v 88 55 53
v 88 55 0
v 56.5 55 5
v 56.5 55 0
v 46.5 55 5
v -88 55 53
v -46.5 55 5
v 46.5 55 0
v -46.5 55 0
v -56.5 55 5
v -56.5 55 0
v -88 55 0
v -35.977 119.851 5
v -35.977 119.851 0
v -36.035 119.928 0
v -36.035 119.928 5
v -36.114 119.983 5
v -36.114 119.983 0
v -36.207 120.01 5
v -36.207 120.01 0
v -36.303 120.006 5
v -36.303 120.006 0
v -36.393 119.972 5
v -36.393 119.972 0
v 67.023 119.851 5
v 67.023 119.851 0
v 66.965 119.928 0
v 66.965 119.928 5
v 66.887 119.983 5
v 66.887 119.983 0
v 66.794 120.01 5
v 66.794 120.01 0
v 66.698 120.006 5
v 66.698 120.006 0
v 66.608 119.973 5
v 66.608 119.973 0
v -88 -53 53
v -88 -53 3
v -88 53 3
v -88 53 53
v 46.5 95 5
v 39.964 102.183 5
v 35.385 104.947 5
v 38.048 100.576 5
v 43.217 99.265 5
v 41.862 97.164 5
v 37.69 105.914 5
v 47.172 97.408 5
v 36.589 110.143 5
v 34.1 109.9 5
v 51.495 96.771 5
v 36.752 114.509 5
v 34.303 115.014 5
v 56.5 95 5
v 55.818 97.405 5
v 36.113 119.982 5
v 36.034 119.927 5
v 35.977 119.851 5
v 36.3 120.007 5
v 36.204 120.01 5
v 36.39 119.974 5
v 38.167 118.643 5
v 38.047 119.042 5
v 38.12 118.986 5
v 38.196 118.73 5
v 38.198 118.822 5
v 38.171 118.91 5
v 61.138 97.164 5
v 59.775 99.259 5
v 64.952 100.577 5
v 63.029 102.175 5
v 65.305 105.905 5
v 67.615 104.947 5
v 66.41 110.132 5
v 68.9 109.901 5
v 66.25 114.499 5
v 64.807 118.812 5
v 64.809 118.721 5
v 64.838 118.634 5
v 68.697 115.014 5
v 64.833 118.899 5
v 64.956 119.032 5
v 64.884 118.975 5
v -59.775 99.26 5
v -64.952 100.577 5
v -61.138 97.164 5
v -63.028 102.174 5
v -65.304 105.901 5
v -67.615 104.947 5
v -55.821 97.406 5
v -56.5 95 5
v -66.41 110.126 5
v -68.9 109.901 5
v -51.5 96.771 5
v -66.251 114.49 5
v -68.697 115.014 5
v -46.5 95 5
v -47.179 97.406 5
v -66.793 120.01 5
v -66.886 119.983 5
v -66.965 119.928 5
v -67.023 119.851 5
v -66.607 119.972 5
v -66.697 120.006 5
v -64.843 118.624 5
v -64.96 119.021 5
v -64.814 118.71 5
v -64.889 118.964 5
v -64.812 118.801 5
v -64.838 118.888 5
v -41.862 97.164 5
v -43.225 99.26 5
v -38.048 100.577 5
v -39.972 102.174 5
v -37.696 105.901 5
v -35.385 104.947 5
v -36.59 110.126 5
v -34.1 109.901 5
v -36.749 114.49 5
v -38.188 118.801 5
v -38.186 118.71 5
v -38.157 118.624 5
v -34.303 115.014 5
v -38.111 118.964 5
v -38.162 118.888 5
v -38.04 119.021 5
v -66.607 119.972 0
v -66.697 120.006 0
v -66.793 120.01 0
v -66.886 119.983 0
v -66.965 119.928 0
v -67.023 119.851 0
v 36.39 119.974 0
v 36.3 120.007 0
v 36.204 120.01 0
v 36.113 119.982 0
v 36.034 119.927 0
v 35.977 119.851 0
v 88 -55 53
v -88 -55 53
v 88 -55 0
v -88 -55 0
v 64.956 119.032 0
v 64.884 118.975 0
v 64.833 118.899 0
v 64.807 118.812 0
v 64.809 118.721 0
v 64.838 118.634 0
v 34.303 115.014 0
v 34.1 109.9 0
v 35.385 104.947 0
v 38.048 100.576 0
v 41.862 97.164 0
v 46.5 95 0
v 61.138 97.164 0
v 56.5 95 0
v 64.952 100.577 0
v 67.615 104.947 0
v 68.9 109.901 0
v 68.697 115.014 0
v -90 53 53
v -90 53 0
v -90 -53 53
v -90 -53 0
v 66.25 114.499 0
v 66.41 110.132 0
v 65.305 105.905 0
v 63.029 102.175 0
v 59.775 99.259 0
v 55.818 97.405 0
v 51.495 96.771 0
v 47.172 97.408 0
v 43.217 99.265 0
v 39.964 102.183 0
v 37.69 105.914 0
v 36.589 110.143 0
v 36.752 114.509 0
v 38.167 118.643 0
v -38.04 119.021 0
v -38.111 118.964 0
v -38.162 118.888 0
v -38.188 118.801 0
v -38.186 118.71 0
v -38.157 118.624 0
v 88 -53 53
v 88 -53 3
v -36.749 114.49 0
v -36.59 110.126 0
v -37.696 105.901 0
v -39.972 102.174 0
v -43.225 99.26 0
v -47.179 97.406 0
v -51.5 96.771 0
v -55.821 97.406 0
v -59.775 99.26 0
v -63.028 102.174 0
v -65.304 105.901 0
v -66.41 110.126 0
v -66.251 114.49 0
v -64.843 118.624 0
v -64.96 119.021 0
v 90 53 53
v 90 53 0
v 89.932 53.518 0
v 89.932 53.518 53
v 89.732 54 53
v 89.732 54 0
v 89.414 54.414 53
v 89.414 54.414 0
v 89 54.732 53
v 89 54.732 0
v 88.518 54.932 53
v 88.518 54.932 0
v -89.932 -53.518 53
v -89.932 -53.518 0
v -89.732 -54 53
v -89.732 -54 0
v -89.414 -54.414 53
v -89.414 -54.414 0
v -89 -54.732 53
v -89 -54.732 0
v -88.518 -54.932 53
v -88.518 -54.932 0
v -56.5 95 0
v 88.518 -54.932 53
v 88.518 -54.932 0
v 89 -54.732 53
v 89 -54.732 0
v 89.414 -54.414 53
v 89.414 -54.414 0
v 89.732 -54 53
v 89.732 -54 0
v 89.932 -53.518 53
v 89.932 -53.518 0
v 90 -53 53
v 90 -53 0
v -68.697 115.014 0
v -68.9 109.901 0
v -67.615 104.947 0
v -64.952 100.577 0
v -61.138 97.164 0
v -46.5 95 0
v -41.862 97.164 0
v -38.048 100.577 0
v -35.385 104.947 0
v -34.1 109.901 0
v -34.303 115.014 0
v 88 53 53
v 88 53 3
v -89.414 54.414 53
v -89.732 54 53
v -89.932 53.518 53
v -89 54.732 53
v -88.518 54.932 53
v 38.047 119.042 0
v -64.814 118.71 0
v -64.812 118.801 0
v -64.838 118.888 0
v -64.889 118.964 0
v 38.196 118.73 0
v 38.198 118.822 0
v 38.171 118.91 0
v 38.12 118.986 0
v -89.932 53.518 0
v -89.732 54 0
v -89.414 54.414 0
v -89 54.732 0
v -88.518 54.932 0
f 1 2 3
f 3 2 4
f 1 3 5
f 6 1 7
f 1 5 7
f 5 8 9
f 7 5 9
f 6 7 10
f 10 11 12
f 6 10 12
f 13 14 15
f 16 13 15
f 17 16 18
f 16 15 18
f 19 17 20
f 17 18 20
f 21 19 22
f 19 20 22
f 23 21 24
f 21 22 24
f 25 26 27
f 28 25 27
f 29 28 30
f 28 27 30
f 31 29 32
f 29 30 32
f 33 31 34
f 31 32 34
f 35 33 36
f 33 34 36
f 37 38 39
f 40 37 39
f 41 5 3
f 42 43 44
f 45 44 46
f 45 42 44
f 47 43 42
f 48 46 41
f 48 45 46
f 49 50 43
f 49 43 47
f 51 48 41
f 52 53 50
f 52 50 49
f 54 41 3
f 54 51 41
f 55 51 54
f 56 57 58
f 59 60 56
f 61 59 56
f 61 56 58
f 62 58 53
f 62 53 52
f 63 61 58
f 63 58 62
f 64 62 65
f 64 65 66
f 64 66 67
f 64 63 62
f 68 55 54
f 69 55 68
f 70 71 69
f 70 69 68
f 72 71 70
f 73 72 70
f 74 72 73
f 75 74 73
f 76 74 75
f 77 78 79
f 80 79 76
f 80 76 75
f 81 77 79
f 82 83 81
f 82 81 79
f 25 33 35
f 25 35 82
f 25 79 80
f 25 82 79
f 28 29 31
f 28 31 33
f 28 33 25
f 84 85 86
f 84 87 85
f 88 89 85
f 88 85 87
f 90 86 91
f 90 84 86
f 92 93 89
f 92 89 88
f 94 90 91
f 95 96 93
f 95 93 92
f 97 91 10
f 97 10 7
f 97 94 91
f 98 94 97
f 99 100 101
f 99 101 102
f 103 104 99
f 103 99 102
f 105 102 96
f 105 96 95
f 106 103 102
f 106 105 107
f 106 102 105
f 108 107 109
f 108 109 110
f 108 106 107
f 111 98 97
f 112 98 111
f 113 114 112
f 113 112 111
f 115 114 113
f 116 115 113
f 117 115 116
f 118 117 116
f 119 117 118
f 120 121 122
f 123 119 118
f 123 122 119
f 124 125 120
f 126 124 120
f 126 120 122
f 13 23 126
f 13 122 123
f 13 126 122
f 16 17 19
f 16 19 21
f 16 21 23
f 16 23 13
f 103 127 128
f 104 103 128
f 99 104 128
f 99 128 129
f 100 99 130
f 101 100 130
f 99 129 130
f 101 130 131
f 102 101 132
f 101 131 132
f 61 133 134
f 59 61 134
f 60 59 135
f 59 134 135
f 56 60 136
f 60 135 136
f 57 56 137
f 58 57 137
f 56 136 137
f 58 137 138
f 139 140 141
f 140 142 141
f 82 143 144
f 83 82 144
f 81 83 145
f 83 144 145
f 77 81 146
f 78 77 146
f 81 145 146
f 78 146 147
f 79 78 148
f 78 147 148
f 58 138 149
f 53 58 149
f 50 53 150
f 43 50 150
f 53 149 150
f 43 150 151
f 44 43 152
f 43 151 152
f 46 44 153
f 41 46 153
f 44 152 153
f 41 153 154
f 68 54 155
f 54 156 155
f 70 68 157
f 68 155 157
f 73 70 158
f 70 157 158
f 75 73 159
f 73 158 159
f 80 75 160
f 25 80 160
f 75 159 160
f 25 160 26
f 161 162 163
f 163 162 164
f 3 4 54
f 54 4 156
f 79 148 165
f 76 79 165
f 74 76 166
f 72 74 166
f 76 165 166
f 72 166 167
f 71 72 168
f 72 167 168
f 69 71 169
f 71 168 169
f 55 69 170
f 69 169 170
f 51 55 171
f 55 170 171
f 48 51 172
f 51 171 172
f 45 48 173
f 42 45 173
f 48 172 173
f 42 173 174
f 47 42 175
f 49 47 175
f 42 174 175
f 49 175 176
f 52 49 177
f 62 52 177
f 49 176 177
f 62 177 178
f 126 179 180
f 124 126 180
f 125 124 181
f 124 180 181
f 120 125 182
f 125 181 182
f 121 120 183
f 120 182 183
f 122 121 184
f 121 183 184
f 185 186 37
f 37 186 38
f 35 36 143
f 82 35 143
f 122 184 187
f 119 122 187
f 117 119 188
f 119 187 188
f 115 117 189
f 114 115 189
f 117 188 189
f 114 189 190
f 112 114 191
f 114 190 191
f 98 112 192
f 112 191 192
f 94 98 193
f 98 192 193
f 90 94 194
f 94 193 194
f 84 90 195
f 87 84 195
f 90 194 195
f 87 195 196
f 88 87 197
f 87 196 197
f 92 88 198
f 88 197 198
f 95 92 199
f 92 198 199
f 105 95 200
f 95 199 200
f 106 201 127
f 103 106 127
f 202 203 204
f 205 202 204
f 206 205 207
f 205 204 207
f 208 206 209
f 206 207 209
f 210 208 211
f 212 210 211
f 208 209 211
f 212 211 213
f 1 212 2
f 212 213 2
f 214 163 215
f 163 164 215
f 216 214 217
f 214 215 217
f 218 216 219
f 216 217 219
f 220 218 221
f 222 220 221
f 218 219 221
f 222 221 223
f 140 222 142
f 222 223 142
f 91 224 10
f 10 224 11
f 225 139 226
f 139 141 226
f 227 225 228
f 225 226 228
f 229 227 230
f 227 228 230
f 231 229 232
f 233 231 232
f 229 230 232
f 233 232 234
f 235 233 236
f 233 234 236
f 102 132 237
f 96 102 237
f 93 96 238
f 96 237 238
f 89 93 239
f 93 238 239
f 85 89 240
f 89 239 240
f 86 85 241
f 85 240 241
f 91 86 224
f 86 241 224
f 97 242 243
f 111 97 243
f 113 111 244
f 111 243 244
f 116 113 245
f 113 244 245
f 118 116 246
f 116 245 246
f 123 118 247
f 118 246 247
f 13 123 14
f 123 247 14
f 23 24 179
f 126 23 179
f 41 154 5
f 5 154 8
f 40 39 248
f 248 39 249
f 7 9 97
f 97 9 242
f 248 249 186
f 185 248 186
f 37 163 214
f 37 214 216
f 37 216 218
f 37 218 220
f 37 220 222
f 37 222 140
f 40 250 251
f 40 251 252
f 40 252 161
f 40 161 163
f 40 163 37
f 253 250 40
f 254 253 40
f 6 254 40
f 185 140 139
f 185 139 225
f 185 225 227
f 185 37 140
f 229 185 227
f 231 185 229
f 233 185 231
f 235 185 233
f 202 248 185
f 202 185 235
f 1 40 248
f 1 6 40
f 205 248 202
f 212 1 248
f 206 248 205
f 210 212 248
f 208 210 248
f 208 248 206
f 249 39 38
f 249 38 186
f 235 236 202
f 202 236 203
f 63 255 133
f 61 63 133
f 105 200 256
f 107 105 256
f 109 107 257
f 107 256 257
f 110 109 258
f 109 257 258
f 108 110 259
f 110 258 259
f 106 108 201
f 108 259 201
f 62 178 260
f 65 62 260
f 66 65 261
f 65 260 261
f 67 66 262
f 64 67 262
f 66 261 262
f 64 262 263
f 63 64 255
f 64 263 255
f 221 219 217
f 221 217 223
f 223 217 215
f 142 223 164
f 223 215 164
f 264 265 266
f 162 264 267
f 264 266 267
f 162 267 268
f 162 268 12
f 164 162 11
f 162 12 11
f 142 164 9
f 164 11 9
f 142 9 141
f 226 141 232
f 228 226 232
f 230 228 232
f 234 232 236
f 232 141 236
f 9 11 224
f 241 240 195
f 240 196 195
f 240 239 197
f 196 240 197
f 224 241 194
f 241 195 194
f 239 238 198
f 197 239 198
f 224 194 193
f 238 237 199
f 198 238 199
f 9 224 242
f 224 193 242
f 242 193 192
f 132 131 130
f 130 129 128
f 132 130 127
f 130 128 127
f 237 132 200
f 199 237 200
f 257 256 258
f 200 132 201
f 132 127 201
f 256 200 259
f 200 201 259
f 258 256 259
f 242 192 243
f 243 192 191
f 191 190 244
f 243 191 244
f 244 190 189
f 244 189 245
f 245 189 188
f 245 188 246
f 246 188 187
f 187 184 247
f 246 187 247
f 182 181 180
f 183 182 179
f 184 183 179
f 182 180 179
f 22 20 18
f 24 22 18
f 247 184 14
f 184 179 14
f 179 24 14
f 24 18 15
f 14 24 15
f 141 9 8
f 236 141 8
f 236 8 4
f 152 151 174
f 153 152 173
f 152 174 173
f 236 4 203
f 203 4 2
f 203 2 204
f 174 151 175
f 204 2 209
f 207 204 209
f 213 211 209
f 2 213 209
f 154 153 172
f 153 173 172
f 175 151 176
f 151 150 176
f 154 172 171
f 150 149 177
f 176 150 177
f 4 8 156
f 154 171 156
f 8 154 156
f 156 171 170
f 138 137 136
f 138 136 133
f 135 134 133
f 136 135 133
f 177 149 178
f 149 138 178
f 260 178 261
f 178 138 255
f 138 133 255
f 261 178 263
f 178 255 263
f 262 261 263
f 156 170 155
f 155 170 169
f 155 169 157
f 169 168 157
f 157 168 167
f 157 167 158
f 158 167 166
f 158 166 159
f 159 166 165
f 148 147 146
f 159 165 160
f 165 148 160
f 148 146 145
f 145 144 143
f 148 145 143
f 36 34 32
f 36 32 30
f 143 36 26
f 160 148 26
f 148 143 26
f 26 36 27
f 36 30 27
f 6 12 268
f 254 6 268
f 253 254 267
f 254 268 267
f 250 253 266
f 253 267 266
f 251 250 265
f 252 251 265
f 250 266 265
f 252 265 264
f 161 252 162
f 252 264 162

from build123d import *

# Parameters (mm, degrees)
F1_DEPTH      = 3
F3_DEPTH      = 50
F4_DEPTH      = 2
F5_R          = 65
F6_DEPTH      = 120.0131182079
F6_DEPTH_BACK = 70


with BuildPart() as f1:
    # F0 (on Top) → F1 (new body)
    with BuildSketch(Plane.XY):
        with BuildLine():
            ThreePointArc((-67.0229373247, 119.8506346331), (-67.6147835705, 104.9467461722), (-56.5, 95))
            ThreePointArc((-56.5, 95), (-51.5, 94.2705098312), (-46.5, 95))
            ThreePointArc((-46.5, 95), (-35.3852164295, 104.9467461722), (-35.9770626753, 119.8506346331))
            ThreePointArc((-35.9770626753, 119.8506346331), (-36.1592170528, 120.0001318772), (-36.3931701723, 119.971925829))
            Line((-36.3931701723, 119.971925829), (-38.0403835084, 119.020906766))
            ThreePointArc((-38.0403835084, 119.020906766), (-38.178168335, 118.8458333976), (-38.1572387337, 118.6240287662))
            ThreePointArc((-38.1572387337, 118.6240287662), (-51.5, 96.7705098312), (-64.8427612663, 118.6240287662))
            ThreePointArc((-64.8427612663, 118.6240287662), (-64.821831665, 118.8458333976), (-64.9596164916, 119.020906766))
            Line((-64.9596164916, 119.020906766), (-66.6068298277, 119.971925829))
            ThreePointArc((-66.6068298277, 119.971925829), (-66.8407829472, 120.0001318772), (-67.0229373247, 119.8506346331))
        make_face()
        with BuildLine():
            Line((-56.5, 95), (-56.5, 55))
            Line((-56.5, 55), (-46.5, 55))
            Line((-46.5, 55), (-46.5, 95))
            ThreePointArc((-46.5, 95), (-51.5, 94.2705098312), (-56.5, 95))
        make_face()
        with BuildLine():
            Line((46.5, 55), (56.5, 55))
            Line((56.5, 55), (56.5, 95))
            ThreePointArc((56.5, 95), (51.5, 94.2705098312), (46.5, 95))
            Line((46.5, 95), (46.5, 55))
        make_face()
        with BuildLine():
            Line((-88, -55), (88, -55))
            ThreePointArc((88, -55), (89.4142135624, -54.4142135624), (90, -53))
            Line((90, -53), (90, 53))
            ThreePointArc((90, 53), (89.4142135624, 54.4142135624), (88, 55))
            Line((88, 55), (56.5, 55))
            Line((56.5, 55), (46.5, 55))
            Line((46.5, 55), (-46.5, 55))
            Line((-46.5, 55), (-56.5, 55))
            Line((-56.5, 55), (-88, 55))
            ThreePointArc((-88, 55), (-89.4142135624, 54.4142135624), (-90, 53))
            Line((-90, 53), (-90, -53))
            ThreePointArc((-90, -53), (-89.4142135624, -54.4142135624), (-88, -55))
        make_face()
        with BuildLine():
            ThreePointArc((46.5, 95), (51.5, 94.2705098312), (56.5, 95))
            ThreePointArc((56.5, 95), (67.6147835705, 104.9467461722), (67.0229373247, 119.8506346331))
            ThreePointArc((67.0229373247, 119.8506346331), (66.8416372621, 119.999881477), (66.6083744282, 119.9728115034))
            Line((66.6083744282, 119.9728115034), (64.9559948815, 119.031841137))
            ThreePointArc((64.9559948815, 119.031841137), (64.8168865883, 118.8566295505), (64.837696354, 118.6338804295))
            ThreePointArc((64.837696354, 118.6338804295), (51.494682782, 96.7705107737), (38.1671728693, 118.6433346293))
            ThreePointArc((38.1671728693, 118.6433346293), (38.1878631933, 118.8669988874), (38.0474675348, 119.0423352753))
            Line((38.0474675348, 119.0423352753), (36.3900688241, 119.9735613901))
            ThreePointArc((36.3900688241, 119.9735613901), (36.157480746, 119.9995347637), (35.9770092024, 119.8505319041))
            ThreePointArc((35.9770092024, 119.8505319041), (35.385239009, 104.9466928494), (46.5, 95))
        make_face()
    extrude(amount=F1_DEPTH)

    # F2 (on face) → F3 (join)
    with BuildSketch(Plane.XY.offset(3)):
        with BuildLine():
            Line((-46.5, 55), (-56.5, 55))
            Line((-56.5, 55), (-88, 55))
            ThreePointArc((-88, 55), (-89.4142135624, 54.4142135624), (-90, 53))
            Line((-90, 53), (-90, -53))
            ThreePointArc((-90, -53), (-89.4142135624, -54.4142135624), (-88, -55))
            Line((-88, -55), (88, -55))
            ThreePointArc((88, -55), (89.4142135624, -54.4142135624), (90, -53))
            Line((90, -53), (90, 53))
            ThreePointArc((90, 53), (89.4142135624, 54.4142135624), (88, 55))
            Line((88, 55), (56.5, 55))
            Line((56.5, 55), (46.5, 55))
            Line((46.5, 55), (-46.5, 55))
        make_face()
        Polygon((-88, 53), (-56.5, 53), (-46.5, 53), (46.5, 53), (56.5, 53), (88, 53), (88, -53), (-88, -53), align=None, mode=Mode.SUBTRACT)
    extrude(amount=F3_DEPTH)

    # F4 (add): faces of the model
    f4_faces = [f1.faces().sort_by_distance(p)[0] for p in [
        (51.4996732425, 83.726401448, 3),
        (-51.5, 83.7238009637, 3),
    ]]
    extrude(f4_faces, amount=F4_DEPTH)

    # F5 (on Front) → F6 (cut, two sides)
    with BuildSketch(Plane.XZ) as f6_sk:
        with Locations((0, 185)):
            Circle(F5_R)
    extrude(amount=-F6_DEPTH, mode=Mode.SUBTRACT)
    extrude(f6_sk.sketch, amount=F6_DEPTH_BACK, mode=Mode.SUBTRACT)


solid = f1.part
